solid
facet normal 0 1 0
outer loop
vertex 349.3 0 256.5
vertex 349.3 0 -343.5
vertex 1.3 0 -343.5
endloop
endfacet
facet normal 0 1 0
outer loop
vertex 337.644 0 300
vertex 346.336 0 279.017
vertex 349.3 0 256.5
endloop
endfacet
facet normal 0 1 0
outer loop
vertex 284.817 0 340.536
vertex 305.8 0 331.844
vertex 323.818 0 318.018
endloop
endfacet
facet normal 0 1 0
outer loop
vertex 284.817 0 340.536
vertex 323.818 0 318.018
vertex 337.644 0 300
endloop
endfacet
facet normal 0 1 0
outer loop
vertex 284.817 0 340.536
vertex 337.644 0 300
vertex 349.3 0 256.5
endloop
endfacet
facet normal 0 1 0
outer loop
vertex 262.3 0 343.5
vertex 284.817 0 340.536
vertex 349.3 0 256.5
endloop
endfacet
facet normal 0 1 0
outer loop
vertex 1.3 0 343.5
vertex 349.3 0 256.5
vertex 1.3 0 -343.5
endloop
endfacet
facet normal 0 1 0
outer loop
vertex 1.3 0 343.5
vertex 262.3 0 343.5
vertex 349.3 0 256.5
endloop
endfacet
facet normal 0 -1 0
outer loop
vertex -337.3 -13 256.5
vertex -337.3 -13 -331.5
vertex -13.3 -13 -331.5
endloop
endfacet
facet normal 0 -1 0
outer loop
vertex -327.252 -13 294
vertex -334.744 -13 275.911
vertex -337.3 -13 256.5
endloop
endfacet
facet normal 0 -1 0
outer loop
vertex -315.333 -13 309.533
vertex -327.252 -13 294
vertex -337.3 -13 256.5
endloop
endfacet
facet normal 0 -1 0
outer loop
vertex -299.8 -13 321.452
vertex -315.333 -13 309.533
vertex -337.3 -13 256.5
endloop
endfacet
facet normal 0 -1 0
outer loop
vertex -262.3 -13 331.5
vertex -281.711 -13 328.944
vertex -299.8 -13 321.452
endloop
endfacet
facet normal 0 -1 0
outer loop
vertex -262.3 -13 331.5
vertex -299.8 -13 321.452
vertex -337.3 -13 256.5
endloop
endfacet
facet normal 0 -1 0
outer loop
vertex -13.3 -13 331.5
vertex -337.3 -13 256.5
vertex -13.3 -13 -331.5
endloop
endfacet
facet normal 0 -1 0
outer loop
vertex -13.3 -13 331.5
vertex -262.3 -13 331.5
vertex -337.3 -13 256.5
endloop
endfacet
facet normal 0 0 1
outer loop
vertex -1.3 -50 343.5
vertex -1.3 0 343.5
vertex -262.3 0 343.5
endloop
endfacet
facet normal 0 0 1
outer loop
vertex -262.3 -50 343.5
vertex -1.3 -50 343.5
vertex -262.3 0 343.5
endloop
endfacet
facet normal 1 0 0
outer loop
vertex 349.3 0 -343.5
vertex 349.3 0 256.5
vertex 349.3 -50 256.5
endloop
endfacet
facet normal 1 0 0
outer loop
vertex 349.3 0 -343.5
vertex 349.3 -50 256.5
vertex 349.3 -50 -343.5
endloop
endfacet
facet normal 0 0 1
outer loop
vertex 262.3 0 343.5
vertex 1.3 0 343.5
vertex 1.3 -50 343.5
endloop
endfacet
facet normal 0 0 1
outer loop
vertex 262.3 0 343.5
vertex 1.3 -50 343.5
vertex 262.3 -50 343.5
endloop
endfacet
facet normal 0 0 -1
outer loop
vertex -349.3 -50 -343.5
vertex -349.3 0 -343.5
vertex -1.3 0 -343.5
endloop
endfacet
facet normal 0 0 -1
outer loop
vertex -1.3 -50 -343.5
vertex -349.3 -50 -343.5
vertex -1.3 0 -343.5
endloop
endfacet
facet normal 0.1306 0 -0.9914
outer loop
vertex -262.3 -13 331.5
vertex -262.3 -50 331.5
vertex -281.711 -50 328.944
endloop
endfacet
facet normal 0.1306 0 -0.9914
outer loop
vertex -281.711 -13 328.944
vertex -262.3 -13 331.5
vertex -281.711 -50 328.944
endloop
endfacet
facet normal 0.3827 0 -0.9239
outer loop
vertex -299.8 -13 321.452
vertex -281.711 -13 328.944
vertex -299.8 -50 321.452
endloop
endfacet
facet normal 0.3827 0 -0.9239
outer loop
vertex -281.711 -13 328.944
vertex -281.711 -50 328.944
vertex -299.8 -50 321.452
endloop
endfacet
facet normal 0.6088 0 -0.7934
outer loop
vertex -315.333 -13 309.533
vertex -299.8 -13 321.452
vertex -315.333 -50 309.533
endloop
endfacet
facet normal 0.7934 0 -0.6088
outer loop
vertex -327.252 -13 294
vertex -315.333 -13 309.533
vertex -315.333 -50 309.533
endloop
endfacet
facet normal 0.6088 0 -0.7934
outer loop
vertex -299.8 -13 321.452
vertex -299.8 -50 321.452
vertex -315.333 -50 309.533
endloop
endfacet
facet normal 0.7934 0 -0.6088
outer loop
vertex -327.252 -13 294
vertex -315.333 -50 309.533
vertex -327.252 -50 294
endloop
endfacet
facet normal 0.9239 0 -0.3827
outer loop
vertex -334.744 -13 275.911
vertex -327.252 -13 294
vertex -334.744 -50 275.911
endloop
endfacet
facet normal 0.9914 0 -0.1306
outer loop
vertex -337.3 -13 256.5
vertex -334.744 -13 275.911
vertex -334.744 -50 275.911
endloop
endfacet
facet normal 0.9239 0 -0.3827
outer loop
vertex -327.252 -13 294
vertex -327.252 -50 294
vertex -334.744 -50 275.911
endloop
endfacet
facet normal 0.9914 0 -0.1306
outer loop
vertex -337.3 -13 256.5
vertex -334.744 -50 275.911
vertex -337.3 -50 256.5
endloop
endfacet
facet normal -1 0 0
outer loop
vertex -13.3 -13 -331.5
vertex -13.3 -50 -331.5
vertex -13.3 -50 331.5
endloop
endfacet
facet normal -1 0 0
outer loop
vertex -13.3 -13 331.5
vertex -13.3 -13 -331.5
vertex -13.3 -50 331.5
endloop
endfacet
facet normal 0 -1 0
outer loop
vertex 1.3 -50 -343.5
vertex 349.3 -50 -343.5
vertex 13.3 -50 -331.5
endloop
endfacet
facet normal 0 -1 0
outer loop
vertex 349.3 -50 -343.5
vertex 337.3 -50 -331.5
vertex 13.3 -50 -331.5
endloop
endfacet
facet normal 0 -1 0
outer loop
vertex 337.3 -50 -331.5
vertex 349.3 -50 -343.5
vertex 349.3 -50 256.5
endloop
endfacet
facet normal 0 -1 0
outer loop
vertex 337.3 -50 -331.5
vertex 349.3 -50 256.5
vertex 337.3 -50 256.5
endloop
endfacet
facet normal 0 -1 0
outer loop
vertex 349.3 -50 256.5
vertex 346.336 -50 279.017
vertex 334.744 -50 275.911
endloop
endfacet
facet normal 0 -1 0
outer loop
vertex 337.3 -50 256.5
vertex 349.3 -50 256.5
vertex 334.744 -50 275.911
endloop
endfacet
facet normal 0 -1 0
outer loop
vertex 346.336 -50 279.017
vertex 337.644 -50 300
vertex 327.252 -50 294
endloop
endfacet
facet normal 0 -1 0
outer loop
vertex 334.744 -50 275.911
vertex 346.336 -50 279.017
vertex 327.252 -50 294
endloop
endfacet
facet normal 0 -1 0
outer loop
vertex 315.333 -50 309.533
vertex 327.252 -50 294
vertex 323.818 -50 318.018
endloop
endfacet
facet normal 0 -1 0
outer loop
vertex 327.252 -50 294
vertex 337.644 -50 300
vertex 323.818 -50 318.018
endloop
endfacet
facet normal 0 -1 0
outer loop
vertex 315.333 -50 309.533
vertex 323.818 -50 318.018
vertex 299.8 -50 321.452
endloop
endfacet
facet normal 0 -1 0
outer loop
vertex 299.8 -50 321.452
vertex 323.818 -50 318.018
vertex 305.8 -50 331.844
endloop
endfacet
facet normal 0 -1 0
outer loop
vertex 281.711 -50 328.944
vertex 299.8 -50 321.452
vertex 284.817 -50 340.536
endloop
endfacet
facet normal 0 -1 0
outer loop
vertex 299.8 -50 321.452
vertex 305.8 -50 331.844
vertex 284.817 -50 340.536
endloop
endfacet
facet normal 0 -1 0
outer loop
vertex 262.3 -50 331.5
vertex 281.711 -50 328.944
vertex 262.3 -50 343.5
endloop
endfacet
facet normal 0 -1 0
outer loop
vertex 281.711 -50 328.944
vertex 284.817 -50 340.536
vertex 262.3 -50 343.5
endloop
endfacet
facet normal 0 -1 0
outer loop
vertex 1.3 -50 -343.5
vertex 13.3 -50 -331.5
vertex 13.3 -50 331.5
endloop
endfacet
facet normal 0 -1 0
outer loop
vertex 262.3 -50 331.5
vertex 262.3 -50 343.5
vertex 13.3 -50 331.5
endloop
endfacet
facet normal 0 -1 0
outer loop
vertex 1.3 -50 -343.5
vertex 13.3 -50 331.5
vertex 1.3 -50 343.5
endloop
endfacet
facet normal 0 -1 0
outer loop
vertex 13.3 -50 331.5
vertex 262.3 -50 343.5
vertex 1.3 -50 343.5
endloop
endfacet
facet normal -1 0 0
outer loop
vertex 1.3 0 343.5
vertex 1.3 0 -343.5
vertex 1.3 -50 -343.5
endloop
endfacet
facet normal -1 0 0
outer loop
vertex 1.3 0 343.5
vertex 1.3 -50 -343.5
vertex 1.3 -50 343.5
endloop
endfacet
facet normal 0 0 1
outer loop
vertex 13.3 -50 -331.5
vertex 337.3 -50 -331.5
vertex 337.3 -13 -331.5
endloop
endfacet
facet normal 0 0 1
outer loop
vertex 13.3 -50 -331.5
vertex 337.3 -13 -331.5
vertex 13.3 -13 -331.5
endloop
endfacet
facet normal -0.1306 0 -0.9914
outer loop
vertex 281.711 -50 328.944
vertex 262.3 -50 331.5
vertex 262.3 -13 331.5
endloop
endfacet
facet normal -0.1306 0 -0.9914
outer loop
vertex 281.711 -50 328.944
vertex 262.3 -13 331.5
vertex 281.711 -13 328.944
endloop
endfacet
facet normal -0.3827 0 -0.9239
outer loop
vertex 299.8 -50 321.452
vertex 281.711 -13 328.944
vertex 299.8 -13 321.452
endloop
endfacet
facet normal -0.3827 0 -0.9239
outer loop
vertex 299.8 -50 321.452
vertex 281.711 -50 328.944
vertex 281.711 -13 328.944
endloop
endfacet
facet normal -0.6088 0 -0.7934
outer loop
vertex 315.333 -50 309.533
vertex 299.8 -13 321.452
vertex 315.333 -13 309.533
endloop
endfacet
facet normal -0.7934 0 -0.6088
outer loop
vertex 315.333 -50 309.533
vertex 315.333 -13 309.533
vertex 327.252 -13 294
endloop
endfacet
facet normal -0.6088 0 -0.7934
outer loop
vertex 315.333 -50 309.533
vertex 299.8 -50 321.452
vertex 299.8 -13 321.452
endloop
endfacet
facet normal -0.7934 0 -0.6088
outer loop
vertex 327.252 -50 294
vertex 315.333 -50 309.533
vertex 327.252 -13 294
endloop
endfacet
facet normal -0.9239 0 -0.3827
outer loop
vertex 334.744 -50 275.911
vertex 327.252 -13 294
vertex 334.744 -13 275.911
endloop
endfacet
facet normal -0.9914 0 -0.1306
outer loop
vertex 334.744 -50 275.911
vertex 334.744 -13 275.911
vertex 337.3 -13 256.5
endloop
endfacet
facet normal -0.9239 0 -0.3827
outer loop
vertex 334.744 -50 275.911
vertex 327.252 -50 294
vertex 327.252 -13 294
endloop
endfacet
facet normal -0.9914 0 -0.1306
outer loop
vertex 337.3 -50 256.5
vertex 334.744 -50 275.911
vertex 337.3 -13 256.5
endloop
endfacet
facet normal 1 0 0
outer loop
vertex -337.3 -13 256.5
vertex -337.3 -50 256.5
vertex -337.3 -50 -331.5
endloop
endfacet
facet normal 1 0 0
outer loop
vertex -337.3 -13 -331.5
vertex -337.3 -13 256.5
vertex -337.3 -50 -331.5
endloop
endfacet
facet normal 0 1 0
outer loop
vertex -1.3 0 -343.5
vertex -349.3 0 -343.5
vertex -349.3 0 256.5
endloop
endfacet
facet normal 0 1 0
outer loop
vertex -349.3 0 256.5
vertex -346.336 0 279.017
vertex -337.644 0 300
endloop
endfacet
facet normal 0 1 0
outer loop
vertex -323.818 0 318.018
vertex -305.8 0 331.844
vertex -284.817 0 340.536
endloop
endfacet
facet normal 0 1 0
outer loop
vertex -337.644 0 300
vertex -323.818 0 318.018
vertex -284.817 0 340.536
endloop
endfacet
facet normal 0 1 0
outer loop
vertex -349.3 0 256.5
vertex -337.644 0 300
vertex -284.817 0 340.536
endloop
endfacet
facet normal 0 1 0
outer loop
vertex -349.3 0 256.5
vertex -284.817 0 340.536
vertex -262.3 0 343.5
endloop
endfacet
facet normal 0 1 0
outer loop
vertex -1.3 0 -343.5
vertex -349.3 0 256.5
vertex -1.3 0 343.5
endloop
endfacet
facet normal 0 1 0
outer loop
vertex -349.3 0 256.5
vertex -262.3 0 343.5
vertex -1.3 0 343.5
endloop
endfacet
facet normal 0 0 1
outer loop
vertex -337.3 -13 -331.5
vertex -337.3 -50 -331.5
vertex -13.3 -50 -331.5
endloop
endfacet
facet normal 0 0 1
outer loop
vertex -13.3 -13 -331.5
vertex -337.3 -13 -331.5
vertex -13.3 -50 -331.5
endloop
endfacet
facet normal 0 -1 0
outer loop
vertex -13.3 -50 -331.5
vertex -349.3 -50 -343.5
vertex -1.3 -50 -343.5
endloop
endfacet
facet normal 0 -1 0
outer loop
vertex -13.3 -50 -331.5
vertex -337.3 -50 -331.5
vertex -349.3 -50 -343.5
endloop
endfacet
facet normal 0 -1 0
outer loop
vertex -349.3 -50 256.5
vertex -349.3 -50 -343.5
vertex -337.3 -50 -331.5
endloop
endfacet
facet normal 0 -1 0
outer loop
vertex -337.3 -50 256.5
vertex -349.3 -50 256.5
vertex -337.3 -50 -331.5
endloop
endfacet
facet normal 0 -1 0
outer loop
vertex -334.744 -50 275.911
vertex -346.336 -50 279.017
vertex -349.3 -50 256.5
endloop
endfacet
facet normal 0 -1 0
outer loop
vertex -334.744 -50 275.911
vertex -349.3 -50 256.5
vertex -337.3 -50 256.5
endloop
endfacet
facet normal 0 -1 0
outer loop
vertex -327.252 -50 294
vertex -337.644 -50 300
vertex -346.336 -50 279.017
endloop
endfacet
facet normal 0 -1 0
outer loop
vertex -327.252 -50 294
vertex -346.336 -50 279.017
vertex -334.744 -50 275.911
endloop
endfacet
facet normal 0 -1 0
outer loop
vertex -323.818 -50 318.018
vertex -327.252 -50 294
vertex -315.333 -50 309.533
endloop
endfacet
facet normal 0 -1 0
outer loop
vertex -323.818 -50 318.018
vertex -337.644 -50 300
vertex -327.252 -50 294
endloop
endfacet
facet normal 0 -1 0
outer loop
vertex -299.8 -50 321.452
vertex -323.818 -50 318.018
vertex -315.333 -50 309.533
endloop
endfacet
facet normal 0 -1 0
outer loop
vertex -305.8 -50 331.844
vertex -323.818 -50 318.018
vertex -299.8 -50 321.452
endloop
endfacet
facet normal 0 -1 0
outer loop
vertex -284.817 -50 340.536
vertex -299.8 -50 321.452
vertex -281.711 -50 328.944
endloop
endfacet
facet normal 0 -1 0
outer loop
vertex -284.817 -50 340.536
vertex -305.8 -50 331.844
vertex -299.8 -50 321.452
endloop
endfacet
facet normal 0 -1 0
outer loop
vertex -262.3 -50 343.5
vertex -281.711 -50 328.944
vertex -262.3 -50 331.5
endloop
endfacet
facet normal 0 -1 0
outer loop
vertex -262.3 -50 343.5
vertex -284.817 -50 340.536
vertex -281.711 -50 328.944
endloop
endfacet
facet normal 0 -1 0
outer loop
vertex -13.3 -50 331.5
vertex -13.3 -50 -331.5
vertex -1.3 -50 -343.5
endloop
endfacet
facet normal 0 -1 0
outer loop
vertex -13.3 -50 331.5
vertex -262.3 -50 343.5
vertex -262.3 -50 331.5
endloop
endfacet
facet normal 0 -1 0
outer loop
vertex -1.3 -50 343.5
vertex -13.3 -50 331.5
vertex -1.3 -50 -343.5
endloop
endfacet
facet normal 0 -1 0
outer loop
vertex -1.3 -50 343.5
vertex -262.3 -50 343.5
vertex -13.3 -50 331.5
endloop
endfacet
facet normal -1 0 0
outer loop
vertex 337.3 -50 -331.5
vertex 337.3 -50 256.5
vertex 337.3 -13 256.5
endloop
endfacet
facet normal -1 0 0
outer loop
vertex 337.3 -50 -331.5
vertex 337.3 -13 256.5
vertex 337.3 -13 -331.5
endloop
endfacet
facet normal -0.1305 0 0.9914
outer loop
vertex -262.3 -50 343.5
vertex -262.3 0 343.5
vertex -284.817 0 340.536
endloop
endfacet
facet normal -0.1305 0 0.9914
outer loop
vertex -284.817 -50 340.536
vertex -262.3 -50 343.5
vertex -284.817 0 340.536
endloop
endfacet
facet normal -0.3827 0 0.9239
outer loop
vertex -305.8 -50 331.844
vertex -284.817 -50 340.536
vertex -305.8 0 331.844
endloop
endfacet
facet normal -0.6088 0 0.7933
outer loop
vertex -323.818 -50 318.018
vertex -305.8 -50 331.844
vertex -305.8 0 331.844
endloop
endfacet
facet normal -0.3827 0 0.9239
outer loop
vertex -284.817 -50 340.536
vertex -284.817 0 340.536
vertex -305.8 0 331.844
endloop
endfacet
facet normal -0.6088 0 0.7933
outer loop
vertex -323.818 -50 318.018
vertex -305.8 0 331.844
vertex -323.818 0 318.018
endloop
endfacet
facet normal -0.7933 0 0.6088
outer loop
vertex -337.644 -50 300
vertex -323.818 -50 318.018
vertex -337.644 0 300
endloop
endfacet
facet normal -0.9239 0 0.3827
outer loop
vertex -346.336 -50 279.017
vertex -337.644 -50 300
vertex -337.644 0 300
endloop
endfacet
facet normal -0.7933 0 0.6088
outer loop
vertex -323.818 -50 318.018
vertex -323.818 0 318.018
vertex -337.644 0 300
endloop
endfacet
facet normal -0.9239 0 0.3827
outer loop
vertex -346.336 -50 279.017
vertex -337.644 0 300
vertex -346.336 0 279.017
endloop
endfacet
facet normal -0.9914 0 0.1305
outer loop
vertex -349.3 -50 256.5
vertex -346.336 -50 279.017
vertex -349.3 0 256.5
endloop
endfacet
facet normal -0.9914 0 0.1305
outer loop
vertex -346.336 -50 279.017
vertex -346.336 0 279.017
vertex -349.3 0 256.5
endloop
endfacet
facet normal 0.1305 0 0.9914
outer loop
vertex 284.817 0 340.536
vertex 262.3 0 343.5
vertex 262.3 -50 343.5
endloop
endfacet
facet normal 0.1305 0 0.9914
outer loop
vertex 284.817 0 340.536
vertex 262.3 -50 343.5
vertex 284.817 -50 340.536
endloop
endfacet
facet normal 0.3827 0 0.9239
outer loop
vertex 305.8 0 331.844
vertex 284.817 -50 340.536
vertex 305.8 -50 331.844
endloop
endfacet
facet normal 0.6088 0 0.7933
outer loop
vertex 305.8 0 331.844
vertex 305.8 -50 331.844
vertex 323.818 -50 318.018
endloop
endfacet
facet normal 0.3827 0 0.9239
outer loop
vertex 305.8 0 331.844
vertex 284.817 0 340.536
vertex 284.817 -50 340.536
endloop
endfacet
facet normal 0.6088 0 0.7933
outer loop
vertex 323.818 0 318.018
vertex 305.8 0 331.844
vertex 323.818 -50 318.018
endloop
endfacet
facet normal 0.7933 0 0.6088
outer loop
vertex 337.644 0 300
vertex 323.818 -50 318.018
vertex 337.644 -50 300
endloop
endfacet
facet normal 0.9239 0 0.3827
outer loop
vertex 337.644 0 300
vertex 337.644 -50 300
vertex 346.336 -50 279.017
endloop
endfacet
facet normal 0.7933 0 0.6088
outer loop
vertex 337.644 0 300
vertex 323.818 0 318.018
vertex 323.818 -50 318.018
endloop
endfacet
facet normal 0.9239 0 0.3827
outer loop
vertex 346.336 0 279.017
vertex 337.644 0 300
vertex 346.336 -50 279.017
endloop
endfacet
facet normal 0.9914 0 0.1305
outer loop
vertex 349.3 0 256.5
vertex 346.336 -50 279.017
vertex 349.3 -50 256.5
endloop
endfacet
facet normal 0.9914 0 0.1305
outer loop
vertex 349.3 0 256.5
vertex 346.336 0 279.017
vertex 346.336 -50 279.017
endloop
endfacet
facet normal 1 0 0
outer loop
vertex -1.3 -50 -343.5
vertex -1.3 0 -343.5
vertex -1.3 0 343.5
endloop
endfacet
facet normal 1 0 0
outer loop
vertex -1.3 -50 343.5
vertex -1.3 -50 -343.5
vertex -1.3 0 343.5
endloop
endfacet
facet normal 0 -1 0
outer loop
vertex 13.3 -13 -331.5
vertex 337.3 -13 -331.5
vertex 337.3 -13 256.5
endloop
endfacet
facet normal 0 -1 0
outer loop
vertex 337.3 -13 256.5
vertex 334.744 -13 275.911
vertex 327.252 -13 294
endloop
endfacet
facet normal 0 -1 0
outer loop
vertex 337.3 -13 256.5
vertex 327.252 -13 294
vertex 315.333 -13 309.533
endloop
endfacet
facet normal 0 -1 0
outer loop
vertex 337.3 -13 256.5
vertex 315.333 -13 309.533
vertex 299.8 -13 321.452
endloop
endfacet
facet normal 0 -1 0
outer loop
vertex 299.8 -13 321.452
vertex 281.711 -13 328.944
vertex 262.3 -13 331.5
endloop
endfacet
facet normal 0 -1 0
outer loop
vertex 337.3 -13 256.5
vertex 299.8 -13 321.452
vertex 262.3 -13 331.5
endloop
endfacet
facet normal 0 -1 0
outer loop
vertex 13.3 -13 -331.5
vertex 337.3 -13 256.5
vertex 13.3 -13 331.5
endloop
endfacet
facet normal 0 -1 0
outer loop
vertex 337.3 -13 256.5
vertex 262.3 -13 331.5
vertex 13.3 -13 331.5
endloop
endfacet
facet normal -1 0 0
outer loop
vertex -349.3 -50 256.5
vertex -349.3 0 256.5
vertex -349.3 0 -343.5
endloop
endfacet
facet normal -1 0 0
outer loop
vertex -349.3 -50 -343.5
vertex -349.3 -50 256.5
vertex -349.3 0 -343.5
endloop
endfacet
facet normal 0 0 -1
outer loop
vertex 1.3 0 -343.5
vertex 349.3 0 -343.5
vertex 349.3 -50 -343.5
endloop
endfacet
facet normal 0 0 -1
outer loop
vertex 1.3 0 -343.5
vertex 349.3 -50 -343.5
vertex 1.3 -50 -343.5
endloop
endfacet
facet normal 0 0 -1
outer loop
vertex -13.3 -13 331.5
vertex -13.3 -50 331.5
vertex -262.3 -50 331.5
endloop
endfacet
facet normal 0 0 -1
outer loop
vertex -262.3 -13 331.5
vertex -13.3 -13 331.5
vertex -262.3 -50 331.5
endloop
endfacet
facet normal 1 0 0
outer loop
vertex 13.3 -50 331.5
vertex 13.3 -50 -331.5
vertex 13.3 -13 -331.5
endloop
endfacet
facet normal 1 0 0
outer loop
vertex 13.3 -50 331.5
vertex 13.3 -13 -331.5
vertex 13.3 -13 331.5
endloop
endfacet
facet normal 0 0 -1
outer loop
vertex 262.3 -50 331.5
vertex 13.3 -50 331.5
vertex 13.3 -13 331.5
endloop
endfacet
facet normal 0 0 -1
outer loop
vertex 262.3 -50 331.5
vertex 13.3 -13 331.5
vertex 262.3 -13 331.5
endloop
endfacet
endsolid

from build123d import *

# Parameters (mm, degrees)
F1_DEPTH = 50
F3_DEPTH = 37


with BuildPart() as f1:
    # F0 (on Front) → F1 (new body)
    with BuildSketch(Plane.XZ):
        with BuildLine():
            Line((-1.3, 343.5), (-262.3, 343.5))
            ThreePointArc((-262.3, 343.5), (-323.81829, 318.01829), (-349.3, 256.5))
            Line((-349.3, 256.5), (-349.3, -343.5))
            Line((-349.3, -343.5), (-1.3, -343.5))
            Line((-1.3, -343.5), (-1.3, 343.5))
        make_face()
    extrude(amount=F1_DEPTH)

    # F2 (on face) → F3 (cut)
    with BuildSketch(Plane.XZ.offset(50)):
        with BuildLine():
            Line((-13.3, 331.5), (-262.3, 331.5))
            ThreePointArc((-262.3, 331.5), (-315.333009, 309.533009), (-337.3, 256.5))
            Line((-337.3, 256.5), (-337.3, -331.5))
            Line((-337.3, -331.5), (-13.3, -331.5))
            Line((-13.3, -331.5), (-13.3, 331.5))
        make_face()
    extrude(amount=-F3_DEPTH, mode=Mode.SUBTRACT)


with BuildPart() as f4_1:
    # F4: instance of F1
    add(f1.part.mirror(Plane.YZ))


solid = Compound([f1.part, f4_1.part])
